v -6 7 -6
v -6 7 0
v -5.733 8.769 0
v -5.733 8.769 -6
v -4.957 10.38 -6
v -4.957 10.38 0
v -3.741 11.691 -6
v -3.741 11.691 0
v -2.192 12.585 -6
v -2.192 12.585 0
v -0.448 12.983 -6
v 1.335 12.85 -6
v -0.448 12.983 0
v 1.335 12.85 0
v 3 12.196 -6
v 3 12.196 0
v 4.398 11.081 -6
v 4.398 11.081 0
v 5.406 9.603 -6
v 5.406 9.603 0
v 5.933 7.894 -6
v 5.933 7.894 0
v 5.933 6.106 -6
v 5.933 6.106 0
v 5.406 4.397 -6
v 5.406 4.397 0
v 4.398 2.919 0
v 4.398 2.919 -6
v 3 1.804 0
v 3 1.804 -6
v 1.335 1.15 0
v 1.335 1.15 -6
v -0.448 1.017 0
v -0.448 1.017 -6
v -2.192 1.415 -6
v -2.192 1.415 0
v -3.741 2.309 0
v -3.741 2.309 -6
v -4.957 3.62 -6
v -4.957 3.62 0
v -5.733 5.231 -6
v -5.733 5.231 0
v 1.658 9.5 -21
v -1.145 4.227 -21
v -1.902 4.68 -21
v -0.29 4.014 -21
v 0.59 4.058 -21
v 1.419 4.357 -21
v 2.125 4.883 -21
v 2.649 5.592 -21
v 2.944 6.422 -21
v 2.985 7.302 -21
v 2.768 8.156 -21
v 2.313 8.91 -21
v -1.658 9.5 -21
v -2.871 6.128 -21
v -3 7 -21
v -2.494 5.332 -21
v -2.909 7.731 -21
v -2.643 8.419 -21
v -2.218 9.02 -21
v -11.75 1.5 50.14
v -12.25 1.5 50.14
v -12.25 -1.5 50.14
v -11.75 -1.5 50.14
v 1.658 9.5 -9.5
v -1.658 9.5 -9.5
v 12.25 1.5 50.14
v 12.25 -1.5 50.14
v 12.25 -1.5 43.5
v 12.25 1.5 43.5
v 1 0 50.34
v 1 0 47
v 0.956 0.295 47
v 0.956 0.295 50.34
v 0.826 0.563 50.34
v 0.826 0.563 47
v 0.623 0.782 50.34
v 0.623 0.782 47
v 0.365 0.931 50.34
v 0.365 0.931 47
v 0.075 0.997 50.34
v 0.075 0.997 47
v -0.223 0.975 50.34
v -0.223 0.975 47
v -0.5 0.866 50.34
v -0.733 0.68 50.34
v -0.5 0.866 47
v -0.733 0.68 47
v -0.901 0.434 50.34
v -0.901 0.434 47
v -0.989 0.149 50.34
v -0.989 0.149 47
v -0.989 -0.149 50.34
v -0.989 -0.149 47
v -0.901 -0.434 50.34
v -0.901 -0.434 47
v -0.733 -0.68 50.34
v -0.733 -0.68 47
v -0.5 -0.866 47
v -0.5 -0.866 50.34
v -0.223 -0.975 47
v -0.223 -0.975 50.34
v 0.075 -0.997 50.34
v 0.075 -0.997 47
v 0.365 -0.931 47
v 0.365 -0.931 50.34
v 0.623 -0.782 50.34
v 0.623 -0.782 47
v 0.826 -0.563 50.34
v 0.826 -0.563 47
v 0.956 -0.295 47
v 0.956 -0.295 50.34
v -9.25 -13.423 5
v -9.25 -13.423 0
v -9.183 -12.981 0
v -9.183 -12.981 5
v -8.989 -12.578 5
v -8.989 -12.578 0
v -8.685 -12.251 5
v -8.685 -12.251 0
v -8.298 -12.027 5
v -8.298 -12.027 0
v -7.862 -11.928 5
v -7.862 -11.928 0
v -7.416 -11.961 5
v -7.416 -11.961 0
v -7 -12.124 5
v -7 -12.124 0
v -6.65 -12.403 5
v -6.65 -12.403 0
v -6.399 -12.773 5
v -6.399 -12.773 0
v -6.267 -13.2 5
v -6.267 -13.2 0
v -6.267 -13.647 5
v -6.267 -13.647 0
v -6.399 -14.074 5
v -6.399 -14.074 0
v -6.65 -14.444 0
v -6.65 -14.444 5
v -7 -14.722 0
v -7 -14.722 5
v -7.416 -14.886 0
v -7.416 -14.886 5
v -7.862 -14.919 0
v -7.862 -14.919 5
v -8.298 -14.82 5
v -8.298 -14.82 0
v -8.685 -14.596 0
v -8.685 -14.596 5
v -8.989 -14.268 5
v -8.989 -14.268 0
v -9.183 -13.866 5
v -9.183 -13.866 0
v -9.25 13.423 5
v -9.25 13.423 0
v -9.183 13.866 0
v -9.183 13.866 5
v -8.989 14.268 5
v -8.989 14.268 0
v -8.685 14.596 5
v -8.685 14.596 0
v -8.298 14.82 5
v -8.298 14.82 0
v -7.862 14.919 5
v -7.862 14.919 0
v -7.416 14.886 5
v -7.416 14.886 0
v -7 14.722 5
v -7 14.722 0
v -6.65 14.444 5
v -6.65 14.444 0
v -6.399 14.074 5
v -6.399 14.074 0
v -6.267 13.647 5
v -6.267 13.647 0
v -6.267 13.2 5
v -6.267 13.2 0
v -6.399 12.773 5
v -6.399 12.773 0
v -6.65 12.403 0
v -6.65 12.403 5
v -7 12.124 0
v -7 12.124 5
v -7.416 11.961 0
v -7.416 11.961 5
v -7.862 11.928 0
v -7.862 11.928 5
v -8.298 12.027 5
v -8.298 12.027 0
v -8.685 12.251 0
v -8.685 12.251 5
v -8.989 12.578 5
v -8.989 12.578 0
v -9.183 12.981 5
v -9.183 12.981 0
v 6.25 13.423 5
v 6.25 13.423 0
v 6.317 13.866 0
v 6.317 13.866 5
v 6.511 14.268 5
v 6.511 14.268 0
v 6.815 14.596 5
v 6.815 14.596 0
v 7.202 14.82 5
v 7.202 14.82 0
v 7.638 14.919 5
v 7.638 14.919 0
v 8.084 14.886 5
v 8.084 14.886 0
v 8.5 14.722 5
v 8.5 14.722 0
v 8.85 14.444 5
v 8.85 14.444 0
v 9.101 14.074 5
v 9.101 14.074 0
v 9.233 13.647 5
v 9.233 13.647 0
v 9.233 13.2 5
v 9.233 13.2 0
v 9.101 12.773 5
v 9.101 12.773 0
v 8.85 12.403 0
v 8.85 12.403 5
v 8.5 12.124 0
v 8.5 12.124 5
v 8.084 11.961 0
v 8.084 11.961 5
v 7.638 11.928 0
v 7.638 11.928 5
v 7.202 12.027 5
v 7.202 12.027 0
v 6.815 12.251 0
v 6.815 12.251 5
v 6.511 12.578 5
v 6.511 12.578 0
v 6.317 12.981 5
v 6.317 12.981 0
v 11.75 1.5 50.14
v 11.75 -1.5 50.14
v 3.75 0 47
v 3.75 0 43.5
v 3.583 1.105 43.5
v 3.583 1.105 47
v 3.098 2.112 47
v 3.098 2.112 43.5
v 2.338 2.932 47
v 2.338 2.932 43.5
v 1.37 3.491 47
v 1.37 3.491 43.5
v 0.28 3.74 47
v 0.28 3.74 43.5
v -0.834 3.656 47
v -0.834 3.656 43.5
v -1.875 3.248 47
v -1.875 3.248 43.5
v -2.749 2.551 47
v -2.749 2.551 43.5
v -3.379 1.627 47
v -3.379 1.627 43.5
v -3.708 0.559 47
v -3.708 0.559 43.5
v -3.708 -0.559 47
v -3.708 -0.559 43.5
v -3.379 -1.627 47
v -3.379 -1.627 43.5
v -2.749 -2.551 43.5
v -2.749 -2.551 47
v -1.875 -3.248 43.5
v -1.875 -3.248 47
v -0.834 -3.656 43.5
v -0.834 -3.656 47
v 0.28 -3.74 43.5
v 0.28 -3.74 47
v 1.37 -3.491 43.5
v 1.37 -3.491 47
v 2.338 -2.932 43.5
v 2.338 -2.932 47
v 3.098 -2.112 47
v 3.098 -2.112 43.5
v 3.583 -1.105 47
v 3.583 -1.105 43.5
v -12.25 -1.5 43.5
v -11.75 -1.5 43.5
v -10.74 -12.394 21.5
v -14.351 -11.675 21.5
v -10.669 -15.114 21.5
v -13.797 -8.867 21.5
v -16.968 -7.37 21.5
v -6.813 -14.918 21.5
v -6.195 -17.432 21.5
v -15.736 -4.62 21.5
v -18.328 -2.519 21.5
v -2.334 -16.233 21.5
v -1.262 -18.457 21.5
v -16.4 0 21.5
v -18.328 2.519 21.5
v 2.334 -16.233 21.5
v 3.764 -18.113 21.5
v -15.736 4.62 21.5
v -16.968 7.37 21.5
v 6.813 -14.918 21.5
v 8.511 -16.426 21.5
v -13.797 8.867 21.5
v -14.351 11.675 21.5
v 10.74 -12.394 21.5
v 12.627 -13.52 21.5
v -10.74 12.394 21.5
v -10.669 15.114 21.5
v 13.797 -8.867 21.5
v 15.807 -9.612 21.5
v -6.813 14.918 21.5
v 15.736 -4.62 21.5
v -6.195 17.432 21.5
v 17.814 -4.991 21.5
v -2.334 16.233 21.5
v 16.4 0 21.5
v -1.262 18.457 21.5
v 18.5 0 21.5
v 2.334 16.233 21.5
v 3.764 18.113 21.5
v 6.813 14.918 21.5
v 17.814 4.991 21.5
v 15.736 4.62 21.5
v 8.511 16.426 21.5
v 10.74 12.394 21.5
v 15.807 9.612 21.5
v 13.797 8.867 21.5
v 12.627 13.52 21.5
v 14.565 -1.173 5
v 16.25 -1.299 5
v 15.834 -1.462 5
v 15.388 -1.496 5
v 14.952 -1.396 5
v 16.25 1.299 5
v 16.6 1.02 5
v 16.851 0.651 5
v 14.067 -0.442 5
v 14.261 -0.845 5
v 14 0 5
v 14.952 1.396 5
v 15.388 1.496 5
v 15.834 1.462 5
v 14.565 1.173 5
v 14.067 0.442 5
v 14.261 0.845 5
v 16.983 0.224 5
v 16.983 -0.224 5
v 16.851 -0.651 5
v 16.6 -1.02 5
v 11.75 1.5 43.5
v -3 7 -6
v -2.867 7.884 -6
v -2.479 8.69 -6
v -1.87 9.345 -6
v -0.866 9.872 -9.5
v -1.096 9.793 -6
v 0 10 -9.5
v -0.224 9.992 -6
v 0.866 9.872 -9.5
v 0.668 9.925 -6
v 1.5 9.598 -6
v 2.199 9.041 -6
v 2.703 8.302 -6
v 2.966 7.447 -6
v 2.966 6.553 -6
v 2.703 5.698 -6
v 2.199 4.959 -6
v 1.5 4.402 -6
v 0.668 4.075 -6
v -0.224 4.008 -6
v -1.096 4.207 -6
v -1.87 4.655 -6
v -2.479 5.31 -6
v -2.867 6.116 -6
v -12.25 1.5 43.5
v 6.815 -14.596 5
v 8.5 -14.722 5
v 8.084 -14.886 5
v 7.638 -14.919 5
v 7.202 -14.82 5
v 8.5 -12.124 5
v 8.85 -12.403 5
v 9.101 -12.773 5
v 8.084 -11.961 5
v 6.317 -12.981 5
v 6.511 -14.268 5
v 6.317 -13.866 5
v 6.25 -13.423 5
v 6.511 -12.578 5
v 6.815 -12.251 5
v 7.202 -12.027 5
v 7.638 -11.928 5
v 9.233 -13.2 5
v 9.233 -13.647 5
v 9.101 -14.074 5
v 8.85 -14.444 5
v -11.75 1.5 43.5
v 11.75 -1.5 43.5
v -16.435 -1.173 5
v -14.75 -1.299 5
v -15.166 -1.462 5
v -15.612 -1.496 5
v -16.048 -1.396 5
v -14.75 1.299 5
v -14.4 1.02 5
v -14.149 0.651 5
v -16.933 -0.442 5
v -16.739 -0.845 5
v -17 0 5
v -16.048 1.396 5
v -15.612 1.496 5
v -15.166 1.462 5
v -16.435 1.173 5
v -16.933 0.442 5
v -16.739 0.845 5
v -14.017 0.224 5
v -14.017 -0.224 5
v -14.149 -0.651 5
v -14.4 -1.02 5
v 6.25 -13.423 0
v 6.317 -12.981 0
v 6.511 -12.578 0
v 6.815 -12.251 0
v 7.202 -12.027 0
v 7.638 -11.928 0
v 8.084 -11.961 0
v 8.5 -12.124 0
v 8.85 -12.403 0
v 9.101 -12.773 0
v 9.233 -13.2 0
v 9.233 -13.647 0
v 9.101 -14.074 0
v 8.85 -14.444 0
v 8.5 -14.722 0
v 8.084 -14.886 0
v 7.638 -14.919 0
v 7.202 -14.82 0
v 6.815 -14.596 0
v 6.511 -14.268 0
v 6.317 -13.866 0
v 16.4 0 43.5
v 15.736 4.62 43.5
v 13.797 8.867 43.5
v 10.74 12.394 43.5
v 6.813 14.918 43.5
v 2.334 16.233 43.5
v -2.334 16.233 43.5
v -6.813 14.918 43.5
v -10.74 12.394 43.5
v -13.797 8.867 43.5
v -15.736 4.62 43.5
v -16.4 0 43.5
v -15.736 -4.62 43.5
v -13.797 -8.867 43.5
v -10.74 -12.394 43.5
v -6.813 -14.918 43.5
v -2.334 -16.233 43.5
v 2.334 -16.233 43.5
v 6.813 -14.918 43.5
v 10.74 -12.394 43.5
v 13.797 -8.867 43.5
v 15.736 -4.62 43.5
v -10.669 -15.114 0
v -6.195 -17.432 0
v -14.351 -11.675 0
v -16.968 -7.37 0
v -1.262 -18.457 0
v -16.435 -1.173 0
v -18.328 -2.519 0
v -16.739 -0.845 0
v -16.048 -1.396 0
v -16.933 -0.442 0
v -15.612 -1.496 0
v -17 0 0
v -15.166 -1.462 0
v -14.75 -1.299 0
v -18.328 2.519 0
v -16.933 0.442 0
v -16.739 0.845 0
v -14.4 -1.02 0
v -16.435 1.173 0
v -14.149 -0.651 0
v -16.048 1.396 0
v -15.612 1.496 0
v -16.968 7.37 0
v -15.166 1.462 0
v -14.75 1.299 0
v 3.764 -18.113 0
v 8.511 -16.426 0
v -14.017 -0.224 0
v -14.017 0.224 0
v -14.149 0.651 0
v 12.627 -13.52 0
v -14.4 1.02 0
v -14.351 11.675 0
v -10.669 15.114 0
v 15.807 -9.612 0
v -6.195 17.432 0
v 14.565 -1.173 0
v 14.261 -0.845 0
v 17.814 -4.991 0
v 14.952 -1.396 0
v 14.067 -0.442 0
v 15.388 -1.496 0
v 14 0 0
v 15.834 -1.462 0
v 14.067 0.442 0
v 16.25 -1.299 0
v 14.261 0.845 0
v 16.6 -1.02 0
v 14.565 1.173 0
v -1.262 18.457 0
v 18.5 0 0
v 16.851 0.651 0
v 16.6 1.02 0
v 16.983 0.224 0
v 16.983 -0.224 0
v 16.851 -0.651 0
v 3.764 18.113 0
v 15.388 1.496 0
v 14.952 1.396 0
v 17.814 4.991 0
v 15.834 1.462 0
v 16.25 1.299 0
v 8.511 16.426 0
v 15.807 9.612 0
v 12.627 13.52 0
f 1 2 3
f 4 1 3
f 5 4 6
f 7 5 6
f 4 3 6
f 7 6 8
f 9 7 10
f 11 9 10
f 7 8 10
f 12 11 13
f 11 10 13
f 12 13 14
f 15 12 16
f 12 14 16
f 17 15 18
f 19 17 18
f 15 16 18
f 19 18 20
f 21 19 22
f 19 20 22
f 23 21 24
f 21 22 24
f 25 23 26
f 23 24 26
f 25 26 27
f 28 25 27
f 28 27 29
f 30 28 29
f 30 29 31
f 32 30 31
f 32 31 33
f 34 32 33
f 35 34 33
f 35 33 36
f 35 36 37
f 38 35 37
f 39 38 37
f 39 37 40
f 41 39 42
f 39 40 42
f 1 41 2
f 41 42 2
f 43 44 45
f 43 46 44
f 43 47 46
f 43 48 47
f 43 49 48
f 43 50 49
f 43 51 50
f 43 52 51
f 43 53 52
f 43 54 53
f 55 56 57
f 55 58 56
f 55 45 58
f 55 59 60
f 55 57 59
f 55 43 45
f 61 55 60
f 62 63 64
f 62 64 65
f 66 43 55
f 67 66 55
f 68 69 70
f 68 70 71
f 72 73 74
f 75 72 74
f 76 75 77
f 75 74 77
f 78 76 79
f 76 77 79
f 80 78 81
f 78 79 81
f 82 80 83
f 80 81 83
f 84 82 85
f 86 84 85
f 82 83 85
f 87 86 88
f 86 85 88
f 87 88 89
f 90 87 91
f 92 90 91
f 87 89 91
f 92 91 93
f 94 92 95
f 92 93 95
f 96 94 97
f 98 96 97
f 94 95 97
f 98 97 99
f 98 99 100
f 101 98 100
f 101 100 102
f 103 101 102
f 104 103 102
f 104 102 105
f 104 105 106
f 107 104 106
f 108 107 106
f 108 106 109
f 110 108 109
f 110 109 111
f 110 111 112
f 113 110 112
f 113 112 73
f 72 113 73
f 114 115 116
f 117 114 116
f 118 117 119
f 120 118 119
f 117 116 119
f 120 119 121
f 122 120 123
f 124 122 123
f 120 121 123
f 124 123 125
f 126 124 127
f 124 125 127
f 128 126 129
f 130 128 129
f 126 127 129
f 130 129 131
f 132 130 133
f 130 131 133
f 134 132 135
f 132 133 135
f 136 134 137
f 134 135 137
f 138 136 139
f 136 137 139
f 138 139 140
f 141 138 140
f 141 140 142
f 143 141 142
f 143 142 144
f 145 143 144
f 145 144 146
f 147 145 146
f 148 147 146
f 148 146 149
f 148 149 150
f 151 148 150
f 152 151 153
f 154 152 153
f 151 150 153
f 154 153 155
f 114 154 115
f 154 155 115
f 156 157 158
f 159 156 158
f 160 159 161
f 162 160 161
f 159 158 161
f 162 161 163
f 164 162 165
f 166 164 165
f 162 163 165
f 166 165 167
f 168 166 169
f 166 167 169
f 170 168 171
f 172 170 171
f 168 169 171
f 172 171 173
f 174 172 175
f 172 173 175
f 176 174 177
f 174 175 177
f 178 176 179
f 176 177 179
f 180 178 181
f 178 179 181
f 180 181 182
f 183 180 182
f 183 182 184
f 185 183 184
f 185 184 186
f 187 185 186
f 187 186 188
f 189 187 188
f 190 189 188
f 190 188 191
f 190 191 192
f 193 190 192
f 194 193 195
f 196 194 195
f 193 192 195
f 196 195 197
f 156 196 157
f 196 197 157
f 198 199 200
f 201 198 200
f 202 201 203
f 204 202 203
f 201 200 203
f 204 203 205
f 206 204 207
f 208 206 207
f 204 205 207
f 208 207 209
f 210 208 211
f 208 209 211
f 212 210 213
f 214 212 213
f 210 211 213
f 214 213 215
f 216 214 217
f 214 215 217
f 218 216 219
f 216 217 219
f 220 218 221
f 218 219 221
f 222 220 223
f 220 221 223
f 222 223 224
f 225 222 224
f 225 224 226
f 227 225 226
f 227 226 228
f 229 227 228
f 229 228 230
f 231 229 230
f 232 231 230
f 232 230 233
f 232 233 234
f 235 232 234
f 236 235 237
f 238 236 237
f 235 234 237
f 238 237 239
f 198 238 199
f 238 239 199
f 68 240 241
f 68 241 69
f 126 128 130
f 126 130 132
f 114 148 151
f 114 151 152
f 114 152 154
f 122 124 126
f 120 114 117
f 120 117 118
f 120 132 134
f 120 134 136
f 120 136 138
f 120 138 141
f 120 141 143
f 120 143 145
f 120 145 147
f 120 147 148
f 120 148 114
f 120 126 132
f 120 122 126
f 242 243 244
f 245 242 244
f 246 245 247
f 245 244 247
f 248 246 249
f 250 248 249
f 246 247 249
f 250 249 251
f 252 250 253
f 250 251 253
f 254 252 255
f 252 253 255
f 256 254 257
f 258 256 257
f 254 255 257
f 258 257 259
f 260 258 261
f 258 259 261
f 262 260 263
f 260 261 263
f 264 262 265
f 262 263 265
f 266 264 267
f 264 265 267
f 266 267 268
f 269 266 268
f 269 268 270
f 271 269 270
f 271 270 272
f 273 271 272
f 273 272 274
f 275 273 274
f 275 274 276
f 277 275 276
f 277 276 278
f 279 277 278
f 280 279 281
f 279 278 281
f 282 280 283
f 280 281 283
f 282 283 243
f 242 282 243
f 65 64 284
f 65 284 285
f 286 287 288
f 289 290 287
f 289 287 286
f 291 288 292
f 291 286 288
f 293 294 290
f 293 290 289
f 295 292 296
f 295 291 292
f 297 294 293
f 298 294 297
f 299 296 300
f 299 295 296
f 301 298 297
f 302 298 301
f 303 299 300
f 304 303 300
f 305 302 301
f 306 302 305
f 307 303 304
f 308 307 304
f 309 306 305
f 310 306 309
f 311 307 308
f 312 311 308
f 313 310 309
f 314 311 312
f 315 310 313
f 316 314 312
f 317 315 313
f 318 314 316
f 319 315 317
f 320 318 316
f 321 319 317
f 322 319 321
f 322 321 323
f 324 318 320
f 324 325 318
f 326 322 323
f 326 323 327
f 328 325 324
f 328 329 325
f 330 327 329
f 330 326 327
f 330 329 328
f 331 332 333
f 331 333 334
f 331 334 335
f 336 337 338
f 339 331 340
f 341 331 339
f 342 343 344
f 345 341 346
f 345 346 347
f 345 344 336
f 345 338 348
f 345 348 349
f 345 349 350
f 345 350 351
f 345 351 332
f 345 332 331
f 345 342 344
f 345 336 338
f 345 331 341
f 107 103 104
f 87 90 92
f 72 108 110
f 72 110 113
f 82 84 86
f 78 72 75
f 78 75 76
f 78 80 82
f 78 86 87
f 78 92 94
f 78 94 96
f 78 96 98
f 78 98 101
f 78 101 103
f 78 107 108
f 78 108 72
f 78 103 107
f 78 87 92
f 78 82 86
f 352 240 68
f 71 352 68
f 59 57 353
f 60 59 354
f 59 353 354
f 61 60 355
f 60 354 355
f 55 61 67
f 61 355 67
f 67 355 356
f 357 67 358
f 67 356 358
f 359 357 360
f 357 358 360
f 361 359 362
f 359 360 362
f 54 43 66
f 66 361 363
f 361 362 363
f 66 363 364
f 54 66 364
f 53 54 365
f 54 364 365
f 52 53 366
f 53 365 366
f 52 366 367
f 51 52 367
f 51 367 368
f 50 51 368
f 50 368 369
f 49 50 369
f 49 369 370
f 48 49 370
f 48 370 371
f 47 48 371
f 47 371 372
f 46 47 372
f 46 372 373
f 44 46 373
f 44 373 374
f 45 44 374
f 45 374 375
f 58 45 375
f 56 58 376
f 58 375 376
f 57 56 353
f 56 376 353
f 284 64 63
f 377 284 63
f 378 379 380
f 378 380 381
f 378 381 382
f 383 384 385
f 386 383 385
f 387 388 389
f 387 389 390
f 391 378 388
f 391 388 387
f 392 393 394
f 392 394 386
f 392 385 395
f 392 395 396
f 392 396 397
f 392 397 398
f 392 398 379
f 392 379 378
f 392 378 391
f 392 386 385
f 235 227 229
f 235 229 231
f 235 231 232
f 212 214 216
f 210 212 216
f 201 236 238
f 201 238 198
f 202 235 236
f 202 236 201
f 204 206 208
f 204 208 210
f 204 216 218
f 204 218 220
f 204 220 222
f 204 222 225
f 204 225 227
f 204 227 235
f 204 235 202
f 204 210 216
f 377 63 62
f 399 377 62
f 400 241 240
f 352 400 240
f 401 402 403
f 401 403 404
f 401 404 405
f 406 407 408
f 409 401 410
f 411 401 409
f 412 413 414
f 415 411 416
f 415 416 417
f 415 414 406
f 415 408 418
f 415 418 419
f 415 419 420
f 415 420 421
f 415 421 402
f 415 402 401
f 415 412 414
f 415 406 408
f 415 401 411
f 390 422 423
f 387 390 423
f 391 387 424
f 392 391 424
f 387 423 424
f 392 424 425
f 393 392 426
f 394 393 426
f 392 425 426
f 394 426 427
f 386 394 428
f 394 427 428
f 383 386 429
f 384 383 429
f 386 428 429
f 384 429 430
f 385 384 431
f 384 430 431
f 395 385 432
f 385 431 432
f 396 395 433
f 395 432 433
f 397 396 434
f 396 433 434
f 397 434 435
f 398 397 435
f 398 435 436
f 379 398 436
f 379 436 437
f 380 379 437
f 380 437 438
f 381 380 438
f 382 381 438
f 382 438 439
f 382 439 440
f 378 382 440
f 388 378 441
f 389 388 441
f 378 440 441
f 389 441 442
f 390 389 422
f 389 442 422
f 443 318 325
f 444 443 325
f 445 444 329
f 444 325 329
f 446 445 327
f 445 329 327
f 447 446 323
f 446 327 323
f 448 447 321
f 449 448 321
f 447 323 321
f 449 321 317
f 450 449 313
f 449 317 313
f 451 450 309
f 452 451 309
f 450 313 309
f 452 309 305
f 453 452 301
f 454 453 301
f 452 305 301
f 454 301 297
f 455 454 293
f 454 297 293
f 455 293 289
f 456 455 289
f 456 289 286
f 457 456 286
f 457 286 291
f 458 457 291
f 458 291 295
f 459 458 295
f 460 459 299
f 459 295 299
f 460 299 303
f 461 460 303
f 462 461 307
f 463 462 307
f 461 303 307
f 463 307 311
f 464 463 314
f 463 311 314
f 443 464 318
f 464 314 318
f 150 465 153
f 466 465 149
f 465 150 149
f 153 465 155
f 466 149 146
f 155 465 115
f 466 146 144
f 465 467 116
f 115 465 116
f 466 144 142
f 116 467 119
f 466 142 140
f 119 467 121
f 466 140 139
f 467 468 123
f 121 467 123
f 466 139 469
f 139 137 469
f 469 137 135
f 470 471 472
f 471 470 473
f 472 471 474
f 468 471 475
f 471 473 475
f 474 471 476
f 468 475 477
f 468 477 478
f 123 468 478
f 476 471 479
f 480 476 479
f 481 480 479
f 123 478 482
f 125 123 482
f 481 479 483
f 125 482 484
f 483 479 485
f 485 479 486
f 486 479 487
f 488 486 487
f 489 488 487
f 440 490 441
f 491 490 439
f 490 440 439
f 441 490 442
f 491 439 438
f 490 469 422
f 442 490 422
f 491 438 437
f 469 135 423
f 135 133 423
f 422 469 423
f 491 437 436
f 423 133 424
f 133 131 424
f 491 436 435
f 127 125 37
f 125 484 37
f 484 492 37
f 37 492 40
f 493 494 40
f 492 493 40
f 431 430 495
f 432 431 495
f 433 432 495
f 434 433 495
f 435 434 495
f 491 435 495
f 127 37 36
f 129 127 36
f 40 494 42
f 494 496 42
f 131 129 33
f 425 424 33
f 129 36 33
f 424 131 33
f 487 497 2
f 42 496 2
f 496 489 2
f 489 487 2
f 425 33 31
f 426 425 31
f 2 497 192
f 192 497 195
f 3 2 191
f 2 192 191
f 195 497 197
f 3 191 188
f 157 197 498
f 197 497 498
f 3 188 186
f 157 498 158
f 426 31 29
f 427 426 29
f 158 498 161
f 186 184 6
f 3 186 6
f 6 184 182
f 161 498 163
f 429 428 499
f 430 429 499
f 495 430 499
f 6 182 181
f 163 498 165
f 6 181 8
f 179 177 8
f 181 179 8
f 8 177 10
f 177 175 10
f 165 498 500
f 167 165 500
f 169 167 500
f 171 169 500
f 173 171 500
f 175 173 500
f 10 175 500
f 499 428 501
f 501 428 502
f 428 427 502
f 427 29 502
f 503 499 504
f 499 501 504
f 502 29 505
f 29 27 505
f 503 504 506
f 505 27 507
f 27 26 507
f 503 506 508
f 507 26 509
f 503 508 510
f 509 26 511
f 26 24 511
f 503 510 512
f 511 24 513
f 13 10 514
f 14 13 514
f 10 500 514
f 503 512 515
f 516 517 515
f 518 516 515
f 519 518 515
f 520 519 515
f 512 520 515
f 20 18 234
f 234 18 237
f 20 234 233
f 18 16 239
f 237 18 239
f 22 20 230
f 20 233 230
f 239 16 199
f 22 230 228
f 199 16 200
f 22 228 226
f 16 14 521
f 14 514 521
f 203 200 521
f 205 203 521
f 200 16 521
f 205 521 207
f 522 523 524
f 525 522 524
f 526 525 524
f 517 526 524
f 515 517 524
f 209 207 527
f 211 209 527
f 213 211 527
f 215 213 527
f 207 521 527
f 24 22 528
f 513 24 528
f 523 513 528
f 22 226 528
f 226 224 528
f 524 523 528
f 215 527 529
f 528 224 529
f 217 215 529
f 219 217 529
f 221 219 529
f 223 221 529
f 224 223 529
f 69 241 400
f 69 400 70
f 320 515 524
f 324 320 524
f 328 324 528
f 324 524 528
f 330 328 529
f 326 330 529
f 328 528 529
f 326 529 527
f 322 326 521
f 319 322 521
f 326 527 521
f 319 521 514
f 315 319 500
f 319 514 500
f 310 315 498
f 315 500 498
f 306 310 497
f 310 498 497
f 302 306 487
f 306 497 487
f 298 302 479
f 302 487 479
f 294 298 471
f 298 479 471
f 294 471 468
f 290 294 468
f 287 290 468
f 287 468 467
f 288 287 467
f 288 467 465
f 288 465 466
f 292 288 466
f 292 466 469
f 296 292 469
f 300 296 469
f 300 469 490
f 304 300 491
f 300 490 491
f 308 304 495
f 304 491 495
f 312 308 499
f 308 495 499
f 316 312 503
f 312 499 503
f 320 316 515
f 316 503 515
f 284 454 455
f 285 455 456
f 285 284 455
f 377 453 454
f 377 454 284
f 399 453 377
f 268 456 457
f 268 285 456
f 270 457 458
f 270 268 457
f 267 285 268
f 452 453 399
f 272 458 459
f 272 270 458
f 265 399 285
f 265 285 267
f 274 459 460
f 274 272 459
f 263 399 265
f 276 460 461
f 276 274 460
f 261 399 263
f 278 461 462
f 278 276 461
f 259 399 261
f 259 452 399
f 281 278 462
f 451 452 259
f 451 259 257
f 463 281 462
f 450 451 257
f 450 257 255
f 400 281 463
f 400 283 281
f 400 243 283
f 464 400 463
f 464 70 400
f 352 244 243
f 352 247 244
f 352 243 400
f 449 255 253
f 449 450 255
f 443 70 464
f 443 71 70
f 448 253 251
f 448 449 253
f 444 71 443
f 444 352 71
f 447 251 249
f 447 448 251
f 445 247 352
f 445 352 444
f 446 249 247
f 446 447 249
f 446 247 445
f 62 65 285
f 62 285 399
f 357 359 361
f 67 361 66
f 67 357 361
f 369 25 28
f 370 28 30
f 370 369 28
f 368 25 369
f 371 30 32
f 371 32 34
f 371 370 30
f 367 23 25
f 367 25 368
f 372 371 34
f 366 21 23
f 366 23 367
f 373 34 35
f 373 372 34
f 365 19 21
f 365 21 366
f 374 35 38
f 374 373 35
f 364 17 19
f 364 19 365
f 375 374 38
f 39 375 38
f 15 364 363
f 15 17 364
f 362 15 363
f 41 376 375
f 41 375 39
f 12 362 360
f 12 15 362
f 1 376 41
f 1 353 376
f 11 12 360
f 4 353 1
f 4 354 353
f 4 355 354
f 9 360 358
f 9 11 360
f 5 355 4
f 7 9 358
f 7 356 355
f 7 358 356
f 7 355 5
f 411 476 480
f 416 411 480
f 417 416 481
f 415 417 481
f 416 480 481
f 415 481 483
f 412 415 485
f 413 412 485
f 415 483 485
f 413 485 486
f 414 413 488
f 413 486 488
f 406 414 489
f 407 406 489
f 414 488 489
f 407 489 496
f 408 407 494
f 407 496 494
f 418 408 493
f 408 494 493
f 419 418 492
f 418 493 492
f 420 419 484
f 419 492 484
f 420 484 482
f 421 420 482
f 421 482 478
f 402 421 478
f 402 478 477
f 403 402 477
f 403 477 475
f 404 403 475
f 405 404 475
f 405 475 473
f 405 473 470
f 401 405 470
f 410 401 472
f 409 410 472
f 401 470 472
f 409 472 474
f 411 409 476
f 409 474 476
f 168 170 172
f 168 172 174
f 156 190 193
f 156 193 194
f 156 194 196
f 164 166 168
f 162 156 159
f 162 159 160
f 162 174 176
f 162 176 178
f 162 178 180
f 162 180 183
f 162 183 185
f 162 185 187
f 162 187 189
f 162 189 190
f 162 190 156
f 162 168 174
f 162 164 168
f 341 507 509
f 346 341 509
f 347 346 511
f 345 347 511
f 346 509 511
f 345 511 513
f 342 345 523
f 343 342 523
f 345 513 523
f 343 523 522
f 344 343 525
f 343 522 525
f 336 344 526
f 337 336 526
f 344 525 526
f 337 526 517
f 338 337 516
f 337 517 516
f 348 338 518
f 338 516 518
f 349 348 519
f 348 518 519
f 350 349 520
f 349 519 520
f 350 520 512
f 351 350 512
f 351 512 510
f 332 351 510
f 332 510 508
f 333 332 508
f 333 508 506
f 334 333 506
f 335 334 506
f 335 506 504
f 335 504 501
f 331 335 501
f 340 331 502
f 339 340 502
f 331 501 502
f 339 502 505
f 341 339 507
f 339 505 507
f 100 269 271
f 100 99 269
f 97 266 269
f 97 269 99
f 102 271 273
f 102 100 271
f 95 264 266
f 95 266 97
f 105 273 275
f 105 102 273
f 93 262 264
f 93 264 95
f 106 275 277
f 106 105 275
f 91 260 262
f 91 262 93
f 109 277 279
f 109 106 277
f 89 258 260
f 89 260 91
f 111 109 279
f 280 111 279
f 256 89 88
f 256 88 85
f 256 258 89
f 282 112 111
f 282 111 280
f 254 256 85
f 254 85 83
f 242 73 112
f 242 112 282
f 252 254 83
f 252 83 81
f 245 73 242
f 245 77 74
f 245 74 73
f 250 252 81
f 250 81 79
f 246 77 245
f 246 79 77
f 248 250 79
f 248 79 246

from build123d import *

# Parameters (mm, degrees)
SKETCH_1_R               = 18.5
EXTRUDE_1_DEPTH          = 21.5
SKETCH_2_R               = 6
EXTRUDE_2_DEPTH          = 6
SKETCH_3_R               = 3
EXTRUDE_3_DEPTH          = 15
CUT_EXTRUDE_1_DEPTH      = 1
CUT_EXTRUDE_1_DEPTH_BACK = 11.5
SKETCH_5_R               = 1.5
CUT_EXTRUDE_2_DEPTH      = 5
SKETCH_6_R               = 16.4
EXTRUDE_4_DEPTH          = 22
SKETCH_7_R               = 1
EXTRUDE_5_DEPTH          = 6.84
SKETCH_8_R               = 3.75
EXTRUDE_6_DEPTH          = 3.5
SKETCH_9_W               = 0.5
SKETCH_9_H               = 3
EXTRUDE_7_DEPTH          = 6.64


with BuildPart() as part:
    # 草图1 → 凸台-拉伸1 (new body)
    with BuildSketch(Plane.XY):
        Circle(SKETCH_1_R)
    extrude(amount=EXTRUDE_1_DEPTH)

    # 草图2 → 凸台-拉伸2 (add)
    with BuildSketch(Plane(origin=(0, 0, 0), x_dir=(-1, 0, 0), z_dir=(0, 0, -1))):
        with Locations((0, 7)):
            Circle(SKETCH_2_R)
    extrude(amount=EXTRUDE_2_DEPTH)

    # 草图3 → 凸台-拉伸3 (add)
    with BuildSketch(Plane(origin=(0, 0, -6), x_dir=(-1, 0, 0), z_dir=(0, 0, -1))):
        with Locations((0, 7)):
            Circle(SKETCH_3_R)
    extrude(amount=EXTRUDE_3_DEPTH)

    # 草图4 → 切除-拉伸1 (cut, two sides)
    with BuildSketch(Plane(origin=(0, 0, -21), x_dir=(-1, 0, 0), z_dir=(0, 0, -1))) as cut_extrude_1_sk:
        Polygon((-80.661429966, 9.5), (-1.658312395, 9.5), (1.658312395, 9.5), (80.661429966, 9.5), (80.661429966, 167.506235142), (-80.661429966, 167.506235142), align=None)
    extrude(amount=CUT_EXTRUDE_1_DEPTH, mode=Mode.SUBTRACT)
    extrude(cut_extrude_1_sk.sketch, amount=-CUT_EXTRUDE_1_DEPTH_BACK, mode=Mode.SUBTRACT)

    # 草图5 → 切除-拉伸2 (cut)
    with BuildSketch(Plane(origin=(0, 0, 0), x_dir=(-1, 0, 0), z_dir=(0, 0, -1))):
        with Locations((15.5, 0)):
            Circle(SKETCH_5_R)
        with Locations((7.75, -13.423393759)):
            Circle(SKETCH_5_R)
        with Locations((-7.75, -13.423393759)):
            Circle(SKETCH_5_R)
        with Locations((-15.5, 0)):
            Circle(SKETCH_5_R)
        with Locations((-7.75, 13.423393759)):
            Circle(SKETCH_5_R)
        with Locations((7.75, 13.423393759)):
            Circle(SKETCH_5_R)
    extrude(amount=-CUT_EXTRUDE_2_DEPTH, mode=Mode.SUBTRACT)

    # 草图6 → 凸台-拉伸4 (add)
    with BuildSketch(Plane.XY.offset(21.5)):
        Circle(SKETCH_6_R)
    extrude(amount=EXTRUDE_4_DEPTH)

    # 草图7 → 凸台-拉伸5 (add)
    with BuildSketch(Plane.XY.offset(43.5)):
        Circle(SKETCH_7_R)
    extrude(amount=EXTRUDE_5_DEPTH)

    # 草图8 → 凸台-拉伸6 (add)
    with BuildSketch(Plane.XY.offset(43.5)):
        Circle(SKETCH_8_R)
    extrude(amount=EXTRUDE_6_DEPTH)

    # 草图9 → 凸台-拉伸7 (add)
    with BuildSketch(Plane.XY.offset(43.5)):
        with Locations((-12, 0)):
            Rectangle(SKETCH_9_W, SKETCH_9_H)
        with Locations((12, 0)):
            Rectangle(SKETCH_9_W, SKETCH_9_H)
    extrude(amount=EXTRUDE_7_DEPTH)


solid = part.part
